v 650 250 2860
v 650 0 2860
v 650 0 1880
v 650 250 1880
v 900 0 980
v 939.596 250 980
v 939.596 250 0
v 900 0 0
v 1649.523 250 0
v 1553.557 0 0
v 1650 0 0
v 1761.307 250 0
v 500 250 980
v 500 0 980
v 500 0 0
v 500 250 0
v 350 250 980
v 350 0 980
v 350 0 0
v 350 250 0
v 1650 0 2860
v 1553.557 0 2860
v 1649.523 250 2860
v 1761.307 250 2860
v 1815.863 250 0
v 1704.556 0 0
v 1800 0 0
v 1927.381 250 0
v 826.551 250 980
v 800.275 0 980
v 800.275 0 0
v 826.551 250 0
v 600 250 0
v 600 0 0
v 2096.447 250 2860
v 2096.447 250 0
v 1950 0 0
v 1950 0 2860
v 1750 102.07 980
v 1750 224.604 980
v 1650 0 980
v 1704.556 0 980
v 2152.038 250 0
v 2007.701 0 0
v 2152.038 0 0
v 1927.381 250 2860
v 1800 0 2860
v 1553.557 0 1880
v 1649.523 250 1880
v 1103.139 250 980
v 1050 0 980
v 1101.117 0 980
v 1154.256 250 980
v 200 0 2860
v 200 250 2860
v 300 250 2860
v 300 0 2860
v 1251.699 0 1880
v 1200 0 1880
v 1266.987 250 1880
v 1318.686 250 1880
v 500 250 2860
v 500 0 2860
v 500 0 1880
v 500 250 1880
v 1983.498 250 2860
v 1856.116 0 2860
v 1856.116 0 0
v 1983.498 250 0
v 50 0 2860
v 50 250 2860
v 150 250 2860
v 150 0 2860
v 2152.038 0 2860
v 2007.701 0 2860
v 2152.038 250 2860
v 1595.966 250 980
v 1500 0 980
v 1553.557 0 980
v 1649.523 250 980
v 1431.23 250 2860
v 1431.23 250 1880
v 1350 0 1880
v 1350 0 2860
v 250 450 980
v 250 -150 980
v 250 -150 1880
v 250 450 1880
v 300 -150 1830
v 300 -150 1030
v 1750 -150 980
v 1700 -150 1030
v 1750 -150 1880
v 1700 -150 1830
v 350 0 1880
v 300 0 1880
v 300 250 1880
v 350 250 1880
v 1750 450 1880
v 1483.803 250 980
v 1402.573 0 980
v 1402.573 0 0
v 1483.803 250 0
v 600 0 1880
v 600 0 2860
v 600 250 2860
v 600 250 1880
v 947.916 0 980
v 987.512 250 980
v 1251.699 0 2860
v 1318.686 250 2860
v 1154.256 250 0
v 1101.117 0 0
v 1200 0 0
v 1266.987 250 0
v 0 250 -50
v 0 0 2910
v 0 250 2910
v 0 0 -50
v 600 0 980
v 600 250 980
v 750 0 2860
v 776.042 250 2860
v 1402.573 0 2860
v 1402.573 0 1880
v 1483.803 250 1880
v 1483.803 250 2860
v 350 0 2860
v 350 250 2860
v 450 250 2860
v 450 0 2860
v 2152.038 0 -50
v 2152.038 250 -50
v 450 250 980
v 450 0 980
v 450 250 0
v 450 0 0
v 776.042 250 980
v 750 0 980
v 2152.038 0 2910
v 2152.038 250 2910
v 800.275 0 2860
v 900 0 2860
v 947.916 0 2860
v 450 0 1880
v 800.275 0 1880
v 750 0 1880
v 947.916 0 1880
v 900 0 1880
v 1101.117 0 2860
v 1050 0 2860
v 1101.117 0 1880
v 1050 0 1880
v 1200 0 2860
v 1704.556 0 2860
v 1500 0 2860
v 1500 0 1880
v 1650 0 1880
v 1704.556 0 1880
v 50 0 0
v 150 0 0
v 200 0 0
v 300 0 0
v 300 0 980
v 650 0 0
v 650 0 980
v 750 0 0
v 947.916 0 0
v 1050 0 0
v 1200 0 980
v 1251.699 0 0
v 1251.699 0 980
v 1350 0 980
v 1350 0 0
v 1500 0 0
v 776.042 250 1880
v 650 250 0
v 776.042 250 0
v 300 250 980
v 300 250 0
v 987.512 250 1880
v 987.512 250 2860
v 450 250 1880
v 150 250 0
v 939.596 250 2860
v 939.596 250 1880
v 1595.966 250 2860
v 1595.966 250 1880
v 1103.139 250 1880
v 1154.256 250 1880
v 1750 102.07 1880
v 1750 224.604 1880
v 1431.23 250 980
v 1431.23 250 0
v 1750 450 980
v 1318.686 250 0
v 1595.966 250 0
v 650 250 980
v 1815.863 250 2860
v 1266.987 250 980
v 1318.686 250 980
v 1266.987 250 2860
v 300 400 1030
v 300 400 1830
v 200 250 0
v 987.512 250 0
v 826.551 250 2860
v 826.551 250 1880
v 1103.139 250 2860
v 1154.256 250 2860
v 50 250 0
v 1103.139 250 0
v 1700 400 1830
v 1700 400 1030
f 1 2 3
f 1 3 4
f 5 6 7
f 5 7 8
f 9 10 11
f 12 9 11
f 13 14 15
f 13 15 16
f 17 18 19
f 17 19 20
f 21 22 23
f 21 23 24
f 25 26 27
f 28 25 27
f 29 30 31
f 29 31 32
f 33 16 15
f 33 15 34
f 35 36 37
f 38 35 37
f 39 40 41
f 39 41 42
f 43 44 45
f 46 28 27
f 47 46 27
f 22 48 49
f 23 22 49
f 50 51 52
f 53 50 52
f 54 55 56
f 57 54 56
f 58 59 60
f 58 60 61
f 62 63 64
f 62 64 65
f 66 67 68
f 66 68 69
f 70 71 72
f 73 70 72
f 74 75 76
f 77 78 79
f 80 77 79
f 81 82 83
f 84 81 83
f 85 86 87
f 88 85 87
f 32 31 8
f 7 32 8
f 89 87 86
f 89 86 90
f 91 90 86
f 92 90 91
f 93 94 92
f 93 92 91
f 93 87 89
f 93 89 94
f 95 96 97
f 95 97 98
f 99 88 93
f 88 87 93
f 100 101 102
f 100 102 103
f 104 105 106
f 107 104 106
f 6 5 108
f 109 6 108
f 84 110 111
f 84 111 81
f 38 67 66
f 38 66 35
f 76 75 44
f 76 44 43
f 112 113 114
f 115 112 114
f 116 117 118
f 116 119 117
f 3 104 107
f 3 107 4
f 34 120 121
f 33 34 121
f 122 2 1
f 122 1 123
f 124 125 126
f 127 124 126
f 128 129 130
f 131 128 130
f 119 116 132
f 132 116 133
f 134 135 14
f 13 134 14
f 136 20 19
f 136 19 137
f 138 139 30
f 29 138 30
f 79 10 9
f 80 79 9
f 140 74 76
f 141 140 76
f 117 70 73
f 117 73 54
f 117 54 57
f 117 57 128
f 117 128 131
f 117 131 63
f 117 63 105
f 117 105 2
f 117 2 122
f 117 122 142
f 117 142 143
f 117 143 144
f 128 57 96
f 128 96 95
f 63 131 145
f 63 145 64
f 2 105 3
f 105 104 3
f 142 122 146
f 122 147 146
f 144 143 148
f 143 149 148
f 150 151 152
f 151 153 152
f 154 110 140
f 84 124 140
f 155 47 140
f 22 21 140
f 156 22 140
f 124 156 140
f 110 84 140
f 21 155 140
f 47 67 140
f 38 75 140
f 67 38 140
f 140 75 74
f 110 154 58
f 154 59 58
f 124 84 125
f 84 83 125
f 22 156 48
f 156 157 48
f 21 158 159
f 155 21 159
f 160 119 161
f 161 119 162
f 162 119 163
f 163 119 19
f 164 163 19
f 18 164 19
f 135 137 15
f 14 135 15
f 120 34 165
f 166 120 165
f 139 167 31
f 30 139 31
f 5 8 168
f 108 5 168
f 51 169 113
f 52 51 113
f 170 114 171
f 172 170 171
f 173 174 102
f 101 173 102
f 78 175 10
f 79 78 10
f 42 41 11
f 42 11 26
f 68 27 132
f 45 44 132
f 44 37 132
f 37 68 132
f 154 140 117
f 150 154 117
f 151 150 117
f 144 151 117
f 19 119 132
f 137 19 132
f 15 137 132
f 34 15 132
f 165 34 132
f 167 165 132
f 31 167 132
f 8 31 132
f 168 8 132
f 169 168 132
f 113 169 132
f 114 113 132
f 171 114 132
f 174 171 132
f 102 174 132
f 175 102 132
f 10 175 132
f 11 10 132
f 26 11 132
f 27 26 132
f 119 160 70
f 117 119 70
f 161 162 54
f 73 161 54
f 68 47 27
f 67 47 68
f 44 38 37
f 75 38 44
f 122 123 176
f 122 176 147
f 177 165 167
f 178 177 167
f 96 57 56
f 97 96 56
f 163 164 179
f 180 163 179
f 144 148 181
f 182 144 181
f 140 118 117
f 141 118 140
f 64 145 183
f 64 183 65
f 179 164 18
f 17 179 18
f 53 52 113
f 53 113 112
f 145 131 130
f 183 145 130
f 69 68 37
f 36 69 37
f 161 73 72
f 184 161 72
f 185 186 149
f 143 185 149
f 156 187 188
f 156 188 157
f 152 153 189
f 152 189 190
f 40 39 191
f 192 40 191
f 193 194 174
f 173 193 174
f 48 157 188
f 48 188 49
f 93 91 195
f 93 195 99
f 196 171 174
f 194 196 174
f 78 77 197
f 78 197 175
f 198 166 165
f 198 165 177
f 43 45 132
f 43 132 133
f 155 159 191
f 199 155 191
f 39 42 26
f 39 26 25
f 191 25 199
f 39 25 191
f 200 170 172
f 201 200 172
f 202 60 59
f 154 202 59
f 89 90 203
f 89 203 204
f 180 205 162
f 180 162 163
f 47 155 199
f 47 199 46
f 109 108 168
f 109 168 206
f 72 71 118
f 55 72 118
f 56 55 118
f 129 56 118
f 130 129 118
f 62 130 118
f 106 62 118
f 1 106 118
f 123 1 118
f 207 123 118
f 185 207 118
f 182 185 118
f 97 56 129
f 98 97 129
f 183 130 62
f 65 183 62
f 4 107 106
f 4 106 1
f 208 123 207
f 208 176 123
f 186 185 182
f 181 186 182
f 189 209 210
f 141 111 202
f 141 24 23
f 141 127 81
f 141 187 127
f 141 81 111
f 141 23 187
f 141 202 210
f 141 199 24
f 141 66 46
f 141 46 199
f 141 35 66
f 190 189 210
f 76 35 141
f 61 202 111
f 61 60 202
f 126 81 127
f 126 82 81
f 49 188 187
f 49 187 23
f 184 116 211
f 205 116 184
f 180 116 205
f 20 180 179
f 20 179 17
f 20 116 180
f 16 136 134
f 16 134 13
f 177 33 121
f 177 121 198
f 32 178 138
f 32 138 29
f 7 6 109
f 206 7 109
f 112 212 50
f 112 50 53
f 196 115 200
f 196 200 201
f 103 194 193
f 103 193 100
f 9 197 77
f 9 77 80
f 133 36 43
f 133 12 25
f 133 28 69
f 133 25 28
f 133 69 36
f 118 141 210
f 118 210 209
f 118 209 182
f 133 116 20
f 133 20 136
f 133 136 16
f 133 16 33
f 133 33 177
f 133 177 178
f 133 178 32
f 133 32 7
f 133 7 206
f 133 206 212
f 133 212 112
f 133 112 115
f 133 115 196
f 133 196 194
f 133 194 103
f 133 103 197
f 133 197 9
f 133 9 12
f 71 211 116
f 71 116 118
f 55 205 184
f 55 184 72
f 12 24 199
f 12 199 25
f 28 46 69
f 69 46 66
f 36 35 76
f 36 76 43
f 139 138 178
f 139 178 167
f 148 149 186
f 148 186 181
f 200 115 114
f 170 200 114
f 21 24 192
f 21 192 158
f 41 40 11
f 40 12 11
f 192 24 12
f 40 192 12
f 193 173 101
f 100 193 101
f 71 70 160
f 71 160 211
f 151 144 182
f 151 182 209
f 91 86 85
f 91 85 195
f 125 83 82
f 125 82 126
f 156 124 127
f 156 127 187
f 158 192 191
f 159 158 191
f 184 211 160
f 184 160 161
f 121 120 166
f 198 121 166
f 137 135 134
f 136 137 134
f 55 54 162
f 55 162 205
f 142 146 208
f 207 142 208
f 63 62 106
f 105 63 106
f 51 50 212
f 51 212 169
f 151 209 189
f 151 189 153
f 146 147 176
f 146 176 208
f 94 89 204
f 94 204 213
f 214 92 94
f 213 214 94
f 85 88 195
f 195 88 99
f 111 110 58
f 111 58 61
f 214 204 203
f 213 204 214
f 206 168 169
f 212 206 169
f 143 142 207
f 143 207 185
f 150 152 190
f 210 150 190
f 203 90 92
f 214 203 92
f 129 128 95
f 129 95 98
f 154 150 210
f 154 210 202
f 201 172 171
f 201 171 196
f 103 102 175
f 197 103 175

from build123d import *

# Parameters (mm, degrees)
F0_W          = 50
F0_H          = 250
F1_DEPTH      = 2860
F2_W          = 2221.6949462891
F2_H          = 250
F3_DEPTH      = 2860.001
F5_W          = 2152.0382275355
F5_H          = 250
F6_DEPTH      = 50
F7_W          = 1500
F7_H          = 900
F8_DEPTH      = 150
F8_DEPTH_BACK = 450
F10_W         = 1400
F10_H         = 800
F11_DEPTH     = 550


# Not quite as in the source:
# - a pattern or mirror of a feature is missing from the dataset's text; its kind, count and spacing are read off the source's solid


with BuildPart() as f1:
    # F0 (on Top) → F1 (new body)
    with BuildSketch(Plane.XY):
        with Locations((25, 125)):
            Rectangle(F0_W, F0_H)
    extrude(amount=F1_DEPTH)


with BuildPart() as f1b:
    # F0 (on Top) → F1, piece 2 (new body)
    with BuildSketch(Plane.XY):
        with Locations((175, 125)):
            Rectangle(F0_W, F0_H)
    extrude(amount=F1_DEPTH)


with BuildPart() as f1c:
    # F0 (on Top) → F1, piece 3 (new body)
    with BuildSketch(Plane.XY):
        with Locations((325, 125)):
            Rectangle(F0_W, F0_H)
    extrude(amount=F1_DEPTH)


with BuildPart() as f1d:
    # F0 (on Top) → F1, piece 4 (new body)
    with BuildSketch(Plane.XY):
        with Locations((475, 125)):
            Rectangle(F0_W, F0_H)
    extrude(amount=F1_DEPTH)


with BuildPart() as f1e:
    # F0 (on Top) → F1, piece 5 (new body)
    with BuildSketch(Plane.XY):
        with Locations((625, 125)):
            Rectangle(F0_W, F0_H)
    extrude(amount=F1_DEPTH)


with BuildPart() as f1f:
    # F0 (on Top) → F1, piece 6 (new body)
    with BuildSketch(Plane.XY):
        Polygon((776.5894605545, 255.2512190888), (750, 0), (799.7260947684, -5.2264231634), (826.5514727946, 250), align=None)
    extrude(amount=F1_DEPTH)


with BuildPart() as f1g:
    # F0 (on Top) → F1, piece 7 (new body)
    with BuildSketch(Plane.XY):
        Polygon((1985.7988202348, 254.516253274), (1932.2269349213, 259.5099715872), (1800, 0), (1844.5503262094, -22.699524987), align=None)
    extrude(amount=F1_DEPTH)


with BuildPart() as f1h:
    # F0 (on Top) → F1, piece 8 (new body)
    with BuildSketch(Plane.XY):
        Polygon((2220.7730672405, 369.0522346192), (2179.9817015181, 392.6031405997), (1950, 0), (1994.1379562017, -23.491292479), align=None)
    extrude(amount=F1_DEPTH)


with BuildPart() as f1i:
    # F0 (on Top) → F1, piece 9 (new body)
    with BuildSketch(Plane.XY):
        Polygon((954.1632750594, 341.9734599461), (900, 0), (944.2202974276, -23.3359228533), (1000.9070231543, 334.5699775654), align=None)
    extrude(amount=F1_DEPTH)


with BuildPart() as f1j:
    # F0 (on Top) → F1, piece 10 (new body)
    with BuildSketch(Plane.XY):
        Polygon((1122.346880499, 340.3653123223), (1050, 0), (1098.9073800367, -10.3955845409), (1171.2542605357, 329.9697277814), align=None)
    extrude(amount=F1_DEPTH)


with BuildPart() as f1k:
    # F0 (on Top) → F1, piece 11 (new body)
    with BuildSketch(Plane.XY):
        Polygon((1287.782294212, 327.6079820043), (1200, 0), (1247.5893550212, -15.3379688571), (1336.018259136, 314.6831941568), align=None)
    extrude(amount=F1_DEPTH)


with BuildPart() as f1l:
    # F0 (on Top) → F1, piece 12 (new body)
    with BuildSketch(Plane.XY):
        Polygon((1436.4378824264, 266.0284477321), (1350, 0), (1397.5528258148, -15.4508497187), (1483.8030352701, 250), align=None)
    extrude(amount=F1_DEPTH)


with BuildPart() as f1m:
    # F0 (on Top) → F1, piece 13 (new body)
    with BuildSketch(Plane.XY):
        Polygon((1601.4181799658, 264.2033915901), (1500, 0), (1546.6790213249, -17.9183974773), (1650.8878155953, 253.5547929215), align=None)
    extrude(amount=F1_DEPTH)


with BuildPart() as f1n:
    # F0 (on Top) → F1, piece 14 (new body)
    with BuildSketch(Plane.XY):
        Polygon((1775.6190094628, 282.1449147549), (1650, 0), (1697.1604126952, -16.6101015777), (1821.1493091009, 261.8735193053), align=None)
    extrude(amount=F1_DEPTH)


with BuildPart() as f3_tool:
    # F2 (on Top) → F3 (new body, through all)
    with BuildSketch(Plane.XY):
        with Locations((1110.8474731445, 125)):
            Rectangle(F2_W, F2_H)
    extrude(amount=F3_DEPTH)


with BuildPart() as f1_1:
    add(f1.part)

    # F3: intersect by f3_tool
    add(f3_tool.part, mode=Mode.INTERSECT)



with BuildPart() as f1b_1:
    add(f1b.part)

    # F3: intersect by f3_tool
    add(f3_tool.part, mode=Mode.INTERSECT)


with BuildPart() as f1c_1:
    add(f1c.part)

    # F3: intersect by f3_tool
    add(f3_tool.part, mode=Mode.INTERSECT)


with BuildPart() as f1d_1:
    add(f1d.part)

    # F3: intersect by f3_tool
    add(f3_tool.part, mode=Mode.INTERSECT)


with BuildPart() as f1e_1:
    add(f1e.part)

    # F3: intersect by f3_tool
    add(f3_tool.part, mode=Mode.INTERSECT)


with BuildPart() as f1f_1:
    add(f1f.part)

    # F3: intersect by f3_tool
    add(f3_tool.part, mode=Mode.INTERSECT)


with BuildPart() as f1g_1:
    add(f1g.part)

    # F3: intersect by f3_tool
    add(f3_tool.part, mode=Mode.INTERSECT)


with BuildPart() as f1h_1:
    add(f1h.part)

    # F3: intersect by f3_tool
    add(f3_tool.part, mode=Mode.INTERSECT)


with BuildPart() as f1i_1:
    add(f1i.part)

    # F3: intersect by f3_tool
    add(f3_tool.part, mode=Mode.INTERSECT)


with BuildPart() as f1j_1:
    add(f1j.part)

    # F3: intersect by f3_tool
    add(f3_tool.part, mode=Mode.INTERSECT)


with BuildPart() as f1k_1:
    add(f1k.part)

    # F3: intersect by f3_tool
    add(f3_tool.part, mode=Mode.INTERSECT)


with BuildPart() as f1l_1:
    add(f1l.part)

    # F3: intersect by f3_tool
    add(f3_tool.part, mode=Mode.INTERSECT)


with BuildPart() as f1m_1:
    add(f1m.part)

    # F3: intersect by f3_tool
    add(f3_tool.part, mode=Mode.INTERSECT)


with BuildPart() as f1n_1:
    add(f1n.part)

    # F3: intersect by f3_tool
    add(f3_tool.part, mode=Mode.INTERSECT)


with BuildPart() as f1_2:
    add(f1_1.part)

    add(f1b_1.part)  # F6 merges F1b

    add(f1c_1.part)  # F6 merges F1c

    add(f1d_1.part)  # F6 merges F1d

    add(f1e_1.part)  # F6 merges F1e

    add(f1f_1.part)  # F6 merges F1f

    add(f1g_1.part)  # F6 merges F1g

    add(f1h_1.part)  # F6 merges F1h

    add(f1i_1.part)  # F6 merges F1i

    add(f1j_1.part)  # F6 merges F1j

    add(f1k_1.part)  # F6 merges F1k

    add(f1l_1.part)  # F6 merges F1l

    add(f1m_1.part)  # F6 merges F1m

    add(f1n_1.part)  # F6 merges F1n
    # F5 (on Top) → F6 (join)
    with BuildSketch(Plane.XY):
        with Locations((1076.0191137678, 125)):
            Rectangle(F5_W, F5_H)
    f6 = extrude(amount=-F6_DEPTH)

    # F6_copies: F6 across plane
    add(f6.mirror(Plane.XY.offset(1430)))


with BuildPart() as f8:
    # F7 (on Front) → F8 (new body, two sides)
    with BuildSketch(Plane.XZ) as f8_sk:
        with Locations((1000, 1430)):
            Rectangle(F7_W, F7_H)
    extrude(amount=F8_DEPTH)
    extrude(f8_sk.sketch, amount=-F8_DEPTH_BACK)


with BuildPart() as f1_3:
    add(f1_2.part)

    # F9: cut F8
    add(f8.part, mode=Mode.SUBTRACT)


with BuildPart() as f8_1:
    add(f8.part)

    # F10 (on face) → F11 (cut)
    with BuildSketch(Plane.XZ.offset(150)):
        with Locations((1000, 1430)):
            Rectangle(F10_W, F10_H)
    extrude(amount=-F11_DEPTH, mode=Mode.SUBTRACT)


solid = Compound([f1_3.part, f8_1.part])
